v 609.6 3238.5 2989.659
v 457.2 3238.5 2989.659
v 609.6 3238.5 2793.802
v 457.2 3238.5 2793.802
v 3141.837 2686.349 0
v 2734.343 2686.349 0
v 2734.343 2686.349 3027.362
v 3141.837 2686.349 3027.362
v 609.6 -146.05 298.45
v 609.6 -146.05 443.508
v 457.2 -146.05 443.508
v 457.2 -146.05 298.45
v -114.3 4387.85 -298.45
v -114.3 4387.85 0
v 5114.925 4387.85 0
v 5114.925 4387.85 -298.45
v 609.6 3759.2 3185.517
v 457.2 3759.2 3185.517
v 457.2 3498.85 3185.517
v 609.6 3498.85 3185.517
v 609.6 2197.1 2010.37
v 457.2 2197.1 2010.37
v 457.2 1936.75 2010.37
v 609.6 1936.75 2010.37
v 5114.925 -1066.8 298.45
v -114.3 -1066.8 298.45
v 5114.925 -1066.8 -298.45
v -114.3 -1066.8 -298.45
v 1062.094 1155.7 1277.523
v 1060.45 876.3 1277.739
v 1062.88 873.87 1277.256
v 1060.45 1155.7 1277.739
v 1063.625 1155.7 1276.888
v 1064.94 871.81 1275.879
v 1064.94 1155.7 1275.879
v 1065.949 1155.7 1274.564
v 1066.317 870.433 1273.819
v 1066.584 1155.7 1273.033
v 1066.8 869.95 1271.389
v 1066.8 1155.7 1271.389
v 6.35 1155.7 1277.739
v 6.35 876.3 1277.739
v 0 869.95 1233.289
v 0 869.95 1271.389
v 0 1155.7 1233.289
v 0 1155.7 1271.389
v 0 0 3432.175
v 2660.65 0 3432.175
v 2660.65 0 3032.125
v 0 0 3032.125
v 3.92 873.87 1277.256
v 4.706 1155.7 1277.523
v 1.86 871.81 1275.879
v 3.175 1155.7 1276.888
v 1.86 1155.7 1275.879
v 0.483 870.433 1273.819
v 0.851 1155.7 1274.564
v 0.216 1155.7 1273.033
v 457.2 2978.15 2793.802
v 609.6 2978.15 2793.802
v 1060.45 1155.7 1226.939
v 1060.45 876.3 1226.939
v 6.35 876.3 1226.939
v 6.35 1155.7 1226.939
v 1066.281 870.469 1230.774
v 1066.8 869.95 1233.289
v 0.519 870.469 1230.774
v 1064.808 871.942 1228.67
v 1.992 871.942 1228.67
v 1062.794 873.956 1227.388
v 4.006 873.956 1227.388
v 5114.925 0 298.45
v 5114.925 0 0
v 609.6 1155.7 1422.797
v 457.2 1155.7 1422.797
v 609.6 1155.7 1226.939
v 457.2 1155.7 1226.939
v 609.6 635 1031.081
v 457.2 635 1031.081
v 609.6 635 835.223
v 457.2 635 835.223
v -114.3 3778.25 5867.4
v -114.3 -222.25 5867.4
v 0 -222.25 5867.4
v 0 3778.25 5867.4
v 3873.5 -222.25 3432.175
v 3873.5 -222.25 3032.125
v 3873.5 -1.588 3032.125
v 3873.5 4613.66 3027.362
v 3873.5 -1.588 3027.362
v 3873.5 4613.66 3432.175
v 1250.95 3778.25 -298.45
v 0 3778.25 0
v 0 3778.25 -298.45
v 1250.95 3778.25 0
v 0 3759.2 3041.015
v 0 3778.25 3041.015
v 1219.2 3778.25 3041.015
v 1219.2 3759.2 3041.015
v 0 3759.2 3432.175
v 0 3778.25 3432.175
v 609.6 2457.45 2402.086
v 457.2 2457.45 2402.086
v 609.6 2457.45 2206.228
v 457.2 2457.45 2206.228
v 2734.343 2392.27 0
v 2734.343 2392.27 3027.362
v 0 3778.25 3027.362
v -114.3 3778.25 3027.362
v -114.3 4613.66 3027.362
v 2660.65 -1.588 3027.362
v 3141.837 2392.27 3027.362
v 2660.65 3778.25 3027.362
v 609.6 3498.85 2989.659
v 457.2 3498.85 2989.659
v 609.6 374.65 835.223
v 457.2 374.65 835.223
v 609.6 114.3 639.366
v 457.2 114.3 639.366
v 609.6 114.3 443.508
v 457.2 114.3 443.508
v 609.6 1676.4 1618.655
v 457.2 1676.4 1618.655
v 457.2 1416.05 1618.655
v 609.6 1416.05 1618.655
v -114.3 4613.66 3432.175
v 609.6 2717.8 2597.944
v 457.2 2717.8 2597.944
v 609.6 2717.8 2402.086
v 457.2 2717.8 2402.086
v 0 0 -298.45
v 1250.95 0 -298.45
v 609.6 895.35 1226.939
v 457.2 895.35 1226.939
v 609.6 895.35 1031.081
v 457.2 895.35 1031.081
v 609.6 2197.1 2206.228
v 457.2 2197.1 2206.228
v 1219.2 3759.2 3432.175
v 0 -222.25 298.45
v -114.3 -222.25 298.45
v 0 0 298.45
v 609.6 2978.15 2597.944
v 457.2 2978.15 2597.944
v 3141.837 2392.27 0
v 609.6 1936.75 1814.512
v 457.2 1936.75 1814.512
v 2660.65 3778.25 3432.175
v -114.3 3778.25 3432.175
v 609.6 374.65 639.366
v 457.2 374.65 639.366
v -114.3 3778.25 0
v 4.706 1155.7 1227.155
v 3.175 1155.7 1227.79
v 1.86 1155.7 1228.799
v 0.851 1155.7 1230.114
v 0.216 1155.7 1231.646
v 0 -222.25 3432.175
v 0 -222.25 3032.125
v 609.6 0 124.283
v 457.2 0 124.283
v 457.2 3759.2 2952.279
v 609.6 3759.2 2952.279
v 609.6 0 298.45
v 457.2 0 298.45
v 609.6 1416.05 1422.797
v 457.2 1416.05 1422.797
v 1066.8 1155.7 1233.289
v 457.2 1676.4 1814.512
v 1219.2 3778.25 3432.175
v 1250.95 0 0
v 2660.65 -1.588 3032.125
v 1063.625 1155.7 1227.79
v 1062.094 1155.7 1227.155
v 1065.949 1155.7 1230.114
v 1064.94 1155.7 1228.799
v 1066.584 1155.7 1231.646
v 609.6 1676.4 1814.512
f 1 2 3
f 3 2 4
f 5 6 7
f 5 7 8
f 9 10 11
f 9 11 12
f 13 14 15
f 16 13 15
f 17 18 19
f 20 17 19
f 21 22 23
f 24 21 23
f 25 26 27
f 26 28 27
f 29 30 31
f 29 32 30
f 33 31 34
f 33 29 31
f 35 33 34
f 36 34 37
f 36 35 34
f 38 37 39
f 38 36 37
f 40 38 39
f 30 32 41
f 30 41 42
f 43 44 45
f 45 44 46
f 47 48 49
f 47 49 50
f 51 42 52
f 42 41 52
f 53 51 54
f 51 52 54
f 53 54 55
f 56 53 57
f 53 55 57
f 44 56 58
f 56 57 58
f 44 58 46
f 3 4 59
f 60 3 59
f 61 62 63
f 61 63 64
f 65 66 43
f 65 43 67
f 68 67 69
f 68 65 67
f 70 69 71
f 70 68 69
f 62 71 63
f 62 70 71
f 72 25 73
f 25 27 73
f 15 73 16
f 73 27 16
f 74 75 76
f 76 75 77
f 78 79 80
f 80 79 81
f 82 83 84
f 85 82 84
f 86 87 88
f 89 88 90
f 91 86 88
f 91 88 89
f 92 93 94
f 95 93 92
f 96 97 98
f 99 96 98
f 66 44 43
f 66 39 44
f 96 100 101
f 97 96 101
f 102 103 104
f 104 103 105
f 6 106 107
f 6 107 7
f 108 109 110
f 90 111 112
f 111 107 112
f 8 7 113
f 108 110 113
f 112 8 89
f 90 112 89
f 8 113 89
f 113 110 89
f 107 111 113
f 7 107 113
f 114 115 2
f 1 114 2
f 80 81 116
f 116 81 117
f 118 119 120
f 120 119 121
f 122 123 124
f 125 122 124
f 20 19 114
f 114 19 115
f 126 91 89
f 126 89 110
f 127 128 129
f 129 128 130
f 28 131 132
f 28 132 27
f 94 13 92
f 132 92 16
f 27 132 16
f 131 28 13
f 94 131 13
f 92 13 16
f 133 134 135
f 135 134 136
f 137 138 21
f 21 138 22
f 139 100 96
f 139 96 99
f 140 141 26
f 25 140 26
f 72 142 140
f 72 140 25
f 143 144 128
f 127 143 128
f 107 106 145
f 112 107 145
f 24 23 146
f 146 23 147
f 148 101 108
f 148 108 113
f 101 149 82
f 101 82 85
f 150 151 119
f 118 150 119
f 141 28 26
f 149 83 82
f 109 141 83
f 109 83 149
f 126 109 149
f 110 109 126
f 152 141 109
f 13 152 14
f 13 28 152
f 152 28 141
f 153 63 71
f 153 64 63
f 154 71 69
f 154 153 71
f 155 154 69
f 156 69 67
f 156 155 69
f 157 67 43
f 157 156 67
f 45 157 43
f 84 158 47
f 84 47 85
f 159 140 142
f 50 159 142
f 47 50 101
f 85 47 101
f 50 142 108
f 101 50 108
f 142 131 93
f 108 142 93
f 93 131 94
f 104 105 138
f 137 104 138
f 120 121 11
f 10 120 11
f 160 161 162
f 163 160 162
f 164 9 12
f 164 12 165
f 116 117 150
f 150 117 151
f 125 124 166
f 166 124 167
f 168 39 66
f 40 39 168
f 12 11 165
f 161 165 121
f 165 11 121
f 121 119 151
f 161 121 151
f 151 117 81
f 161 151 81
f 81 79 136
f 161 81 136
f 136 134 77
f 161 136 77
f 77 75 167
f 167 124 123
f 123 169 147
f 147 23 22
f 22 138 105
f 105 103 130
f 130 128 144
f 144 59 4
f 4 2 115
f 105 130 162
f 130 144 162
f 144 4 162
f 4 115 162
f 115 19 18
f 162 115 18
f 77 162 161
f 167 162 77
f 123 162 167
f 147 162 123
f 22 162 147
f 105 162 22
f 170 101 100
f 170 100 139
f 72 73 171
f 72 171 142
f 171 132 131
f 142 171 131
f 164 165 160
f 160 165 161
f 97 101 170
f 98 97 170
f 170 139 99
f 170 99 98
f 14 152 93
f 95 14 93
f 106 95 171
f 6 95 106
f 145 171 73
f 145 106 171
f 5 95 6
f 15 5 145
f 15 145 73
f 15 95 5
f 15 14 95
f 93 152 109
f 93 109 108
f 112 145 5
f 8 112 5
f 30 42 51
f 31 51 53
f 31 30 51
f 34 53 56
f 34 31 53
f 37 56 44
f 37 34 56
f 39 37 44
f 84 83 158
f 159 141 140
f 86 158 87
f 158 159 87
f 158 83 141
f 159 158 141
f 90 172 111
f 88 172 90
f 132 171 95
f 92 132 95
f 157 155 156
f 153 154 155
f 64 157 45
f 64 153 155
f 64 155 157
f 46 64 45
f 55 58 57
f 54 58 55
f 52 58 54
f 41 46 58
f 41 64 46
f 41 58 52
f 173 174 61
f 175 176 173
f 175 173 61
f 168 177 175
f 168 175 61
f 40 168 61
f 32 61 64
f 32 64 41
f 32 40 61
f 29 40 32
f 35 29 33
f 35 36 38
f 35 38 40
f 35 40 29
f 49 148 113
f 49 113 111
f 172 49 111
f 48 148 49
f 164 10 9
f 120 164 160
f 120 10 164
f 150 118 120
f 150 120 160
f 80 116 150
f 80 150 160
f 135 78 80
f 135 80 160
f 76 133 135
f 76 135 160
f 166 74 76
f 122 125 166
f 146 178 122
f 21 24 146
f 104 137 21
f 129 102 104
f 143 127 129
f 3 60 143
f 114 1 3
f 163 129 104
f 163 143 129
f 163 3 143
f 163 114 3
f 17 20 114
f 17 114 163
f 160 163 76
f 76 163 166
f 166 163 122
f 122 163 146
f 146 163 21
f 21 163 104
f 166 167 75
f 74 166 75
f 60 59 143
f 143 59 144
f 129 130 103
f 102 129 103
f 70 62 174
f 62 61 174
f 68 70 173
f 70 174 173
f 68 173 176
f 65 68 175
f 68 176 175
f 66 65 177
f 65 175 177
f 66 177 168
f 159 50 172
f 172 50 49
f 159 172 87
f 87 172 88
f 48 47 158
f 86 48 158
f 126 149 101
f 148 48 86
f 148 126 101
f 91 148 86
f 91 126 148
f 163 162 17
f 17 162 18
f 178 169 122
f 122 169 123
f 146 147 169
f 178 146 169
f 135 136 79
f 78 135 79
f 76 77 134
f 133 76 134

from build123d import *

# Parameters (mm, degrees)
F1_W         = 5229.225
F1_H         = 5454.65
F1_W_2       = 1250.95
F1_H_2       = 3778.25
F2_DEPTH     = 298.45
F4_DEPTH     = 298.45
F6_DEPTH     = 404.8125
F8_DEPTH     = 400.05
F9_W         = 114.3
F9_H         = 4000.5
F10_DEPTH    = 5867.4
F11_W        = 1219.2
F11_H        = 19.05
F12_DEPTH    = 391.16
F15_DEPTH    = 152.4
F16_W        = 407.4945449829
F16_H        = 294.0797805786
F17_DEPTH    = 3027.3625
F20_DEPTH    = 533.4
F21_T1_DEPTH = 311.15


# Not quite as in the source:
# - a fillet or chamfer that OpenCascade refuses, or shapes differently, is made with other operations: its cross-section is extruded or revolved along the edge and cut away or added


with BuildPart() as f2:
    # F1 (on Top) → F2 (new body)
    with BuildSketch(Plane.XY):
        with Locations((2500.3125, 1660.525)):
            Rectangle(F1_W, F1_H)
        with Locations((625.475, 1889.125)):
            Rectangle(F1_W_2, F1_H_2, mode=Mode.SUBTRACT)
    extrude(amount=-F2_DEPTH)

    # F3 (on face) → F4 (join)
    with BuildSketch(Plane.XY):
        Polygon((-114.3, 0), (-114.3, -1066.8), (5114.925, -1066.8), (5114.925, 0), (1250.95, 0), (0, 0), align=None)
    extrude(amount=F4_DEPTH)



with BuildPart() as f6:
    # F5 (on offset) → F6 (new body)
    with BuildSketch(Plane.XY.offset(3432.175)):
        Polygon((0, 0), (0, 3778.25), (2660.65, 3778.25), (2660.65, -1.5875), (3873.5, -1.5875), (3873.5, 4613.6604547501), (3863.975, 4613.6604547501), (-114.3, 4613.6604547501), (-114.3, 0), align=None)
    extrude(amount=-F6_DEPTH)

    # F7 (on face) → F8 (join)
    with BuildSketch(Plane.XY.offset(3432.175)):
        Polygon((0, 0), (-114.3, 0), (-114.3, -222.25), (3873.5, -222.25), (3873.5, -1.5875), (2660.65, -1.5875), (2660.65, 0), align=None)
    extrude(amount=-F8_DEPTH)


with BuildPart() as f2_1:
    add(f2.part)

    add(f6.part)  # F10 merges F6
    # F9 (on face) → F10 (join)
    with BuildSketch(Plane.XY):
        with Locations((-57.15, 1778)):
            Rectangle(F9_W, F9_H)
    extrude(amount=F10_DEPTH)

    # F16 (on face) → F17 (join, through all)
    with BuildSketch(Plane.XY):
        with Locations((2938.0900859833, 2539.3095016479)):
            Rectangle(F16_W, F16_H)
    extrude(amount=F17_DEPTH)


with BuildPart() as f12:
    # F11 (on face) → F12 (new body)
    with BuildSketch(Plane.XY.offset(3432.175)):
        with Locations((609.6, 3768.725)):
            Rectangle(F11_W, F11_H)
    extrude(amount=-F12_DEPTH)


with BuildPart() as f15:
    # F14 (on offset) → F15 (new body)
    with BuildSketch(Plane.YZ.offset(457.2)):
        Polygon((3759.2, 2952.2790994624), (3759.2, 3185.5171875), (3498.85, 3185.5171875), (3498.85, 2989.659375), (3238.5, 2989.659375), (3238.5, 2793.8015625), (2978.15, 2793.8015625), (2978.15, 2597.94375), (2717.8, 2597.94375), (2717.8, 2402.0859375), (2457.45, 2402.0859375), (2457.45, 2206.228125), (2197.1, 2206.228125), (2197.1, 2010.3703125), (1936.75, 2010.3703125), (1936.75, 1814.5125), (1676.4, 1814.5125), (1676.4, 1618.6546875), (1416.05, 1618.6546875), (1416.05, 1422.796875), (1155.7, 1422.796875), (1155.7, 1226.9390625), (895.35, 1226.9390625), (895.35, 1031.08125), (635, 1031.08125), (635, 835.2234375), (374.65, 835.2234375), (374.65, 639.365625), (114.3, 639.365625), (114.3, 443.5078125), (-146.05, 443.5078125), (-146.05, 298.45), (0, 298.45), (0, 124.2833677551), align=None)
    extrude(amount=F15_DEPTH)


with BuildPart() as f20:
    # F19 (on mid) → F20 (new body, symmetric)
    with BuildSketch(Plane.YZ.offset(533.4)):
        with BuildLine():
            Line((876.3, 1226.9390625), (1155.7, 1226.9390625))
            Line((1155.7, 1226.9390625), (1155.7, 1277.7390625))
            Line((1155.7, 1277.7390625), (876.3, 1277.7390625))
            ThreePointArc((876.3, 1277.7390625), (871.8098719395, 1275.8791905605), (869.95, 1271.3890625))
            Line((869.95, 1271.3890625), (869.95, 1233.2890625))
            ThreePointArc((869.95, 1233.2890625), (871.8098719395, 1228.7989344395), (876.3, 1226.9390625))
        make_face()
    extrude(amount=F20_DEPTH, both=True)

    # F21: fillet of radius 6.35 on 4 edges, made by hand

    # F21_s2 → F21_t1 (cut)
    with BuildSketch(Plane.XZ.offset(-1171.575)):
        with BuildLine():
            ThreePointArc((1060.45, 1277.7390625), (1064.9401280605, 1275.8791905605), (1066.8, 1271.3890625))
            Line((1066.8, 1271.3890625), (1066.8, 1277.7390625))
            Line((1066.8, 1277.7390625), (1060.45, 1277.7390625))
        make_face()
        with BuildLine():
            ThreePointArc((1060.45, 1226.9390625), (1064.9401280605, 1228.7989344395), (1066.8, 1233.2890625))
            Line((1066.8, 1233.2890625), (1066.8, 1226.9390625))
            Line((1066.8, 1226.9390625), (1060.45, 1226.9390625))
        make_face()
        with BuildLine():
            ThreePointArc((6.35, 1277.7390625), (1.8598719395, 1275.8791905605), (0, 1271.3890625))
            Line((0, 1271.3890625), (0, 1277.7390625))
            Line((0, 1277.7390625), (6.35, 1277.7390625))
        make_face()
        with BuildLine():
            ThreePointArc((6.35, 1226.9390625), (1.8598719395, 1228.7989344395), (0, 1233.2890625))
            Line((0, 1233.2890625), (0, 1226.9390625))
            Line((0, 1226.9390625), (6.35, 1226.9390625))
        make_face()
    extrude(amount=F21_T1_DEPTH, mode=Mode.SUBTRACT)


solid = Compound([f2_1.part, f12.part, f15.part, f20.part])
